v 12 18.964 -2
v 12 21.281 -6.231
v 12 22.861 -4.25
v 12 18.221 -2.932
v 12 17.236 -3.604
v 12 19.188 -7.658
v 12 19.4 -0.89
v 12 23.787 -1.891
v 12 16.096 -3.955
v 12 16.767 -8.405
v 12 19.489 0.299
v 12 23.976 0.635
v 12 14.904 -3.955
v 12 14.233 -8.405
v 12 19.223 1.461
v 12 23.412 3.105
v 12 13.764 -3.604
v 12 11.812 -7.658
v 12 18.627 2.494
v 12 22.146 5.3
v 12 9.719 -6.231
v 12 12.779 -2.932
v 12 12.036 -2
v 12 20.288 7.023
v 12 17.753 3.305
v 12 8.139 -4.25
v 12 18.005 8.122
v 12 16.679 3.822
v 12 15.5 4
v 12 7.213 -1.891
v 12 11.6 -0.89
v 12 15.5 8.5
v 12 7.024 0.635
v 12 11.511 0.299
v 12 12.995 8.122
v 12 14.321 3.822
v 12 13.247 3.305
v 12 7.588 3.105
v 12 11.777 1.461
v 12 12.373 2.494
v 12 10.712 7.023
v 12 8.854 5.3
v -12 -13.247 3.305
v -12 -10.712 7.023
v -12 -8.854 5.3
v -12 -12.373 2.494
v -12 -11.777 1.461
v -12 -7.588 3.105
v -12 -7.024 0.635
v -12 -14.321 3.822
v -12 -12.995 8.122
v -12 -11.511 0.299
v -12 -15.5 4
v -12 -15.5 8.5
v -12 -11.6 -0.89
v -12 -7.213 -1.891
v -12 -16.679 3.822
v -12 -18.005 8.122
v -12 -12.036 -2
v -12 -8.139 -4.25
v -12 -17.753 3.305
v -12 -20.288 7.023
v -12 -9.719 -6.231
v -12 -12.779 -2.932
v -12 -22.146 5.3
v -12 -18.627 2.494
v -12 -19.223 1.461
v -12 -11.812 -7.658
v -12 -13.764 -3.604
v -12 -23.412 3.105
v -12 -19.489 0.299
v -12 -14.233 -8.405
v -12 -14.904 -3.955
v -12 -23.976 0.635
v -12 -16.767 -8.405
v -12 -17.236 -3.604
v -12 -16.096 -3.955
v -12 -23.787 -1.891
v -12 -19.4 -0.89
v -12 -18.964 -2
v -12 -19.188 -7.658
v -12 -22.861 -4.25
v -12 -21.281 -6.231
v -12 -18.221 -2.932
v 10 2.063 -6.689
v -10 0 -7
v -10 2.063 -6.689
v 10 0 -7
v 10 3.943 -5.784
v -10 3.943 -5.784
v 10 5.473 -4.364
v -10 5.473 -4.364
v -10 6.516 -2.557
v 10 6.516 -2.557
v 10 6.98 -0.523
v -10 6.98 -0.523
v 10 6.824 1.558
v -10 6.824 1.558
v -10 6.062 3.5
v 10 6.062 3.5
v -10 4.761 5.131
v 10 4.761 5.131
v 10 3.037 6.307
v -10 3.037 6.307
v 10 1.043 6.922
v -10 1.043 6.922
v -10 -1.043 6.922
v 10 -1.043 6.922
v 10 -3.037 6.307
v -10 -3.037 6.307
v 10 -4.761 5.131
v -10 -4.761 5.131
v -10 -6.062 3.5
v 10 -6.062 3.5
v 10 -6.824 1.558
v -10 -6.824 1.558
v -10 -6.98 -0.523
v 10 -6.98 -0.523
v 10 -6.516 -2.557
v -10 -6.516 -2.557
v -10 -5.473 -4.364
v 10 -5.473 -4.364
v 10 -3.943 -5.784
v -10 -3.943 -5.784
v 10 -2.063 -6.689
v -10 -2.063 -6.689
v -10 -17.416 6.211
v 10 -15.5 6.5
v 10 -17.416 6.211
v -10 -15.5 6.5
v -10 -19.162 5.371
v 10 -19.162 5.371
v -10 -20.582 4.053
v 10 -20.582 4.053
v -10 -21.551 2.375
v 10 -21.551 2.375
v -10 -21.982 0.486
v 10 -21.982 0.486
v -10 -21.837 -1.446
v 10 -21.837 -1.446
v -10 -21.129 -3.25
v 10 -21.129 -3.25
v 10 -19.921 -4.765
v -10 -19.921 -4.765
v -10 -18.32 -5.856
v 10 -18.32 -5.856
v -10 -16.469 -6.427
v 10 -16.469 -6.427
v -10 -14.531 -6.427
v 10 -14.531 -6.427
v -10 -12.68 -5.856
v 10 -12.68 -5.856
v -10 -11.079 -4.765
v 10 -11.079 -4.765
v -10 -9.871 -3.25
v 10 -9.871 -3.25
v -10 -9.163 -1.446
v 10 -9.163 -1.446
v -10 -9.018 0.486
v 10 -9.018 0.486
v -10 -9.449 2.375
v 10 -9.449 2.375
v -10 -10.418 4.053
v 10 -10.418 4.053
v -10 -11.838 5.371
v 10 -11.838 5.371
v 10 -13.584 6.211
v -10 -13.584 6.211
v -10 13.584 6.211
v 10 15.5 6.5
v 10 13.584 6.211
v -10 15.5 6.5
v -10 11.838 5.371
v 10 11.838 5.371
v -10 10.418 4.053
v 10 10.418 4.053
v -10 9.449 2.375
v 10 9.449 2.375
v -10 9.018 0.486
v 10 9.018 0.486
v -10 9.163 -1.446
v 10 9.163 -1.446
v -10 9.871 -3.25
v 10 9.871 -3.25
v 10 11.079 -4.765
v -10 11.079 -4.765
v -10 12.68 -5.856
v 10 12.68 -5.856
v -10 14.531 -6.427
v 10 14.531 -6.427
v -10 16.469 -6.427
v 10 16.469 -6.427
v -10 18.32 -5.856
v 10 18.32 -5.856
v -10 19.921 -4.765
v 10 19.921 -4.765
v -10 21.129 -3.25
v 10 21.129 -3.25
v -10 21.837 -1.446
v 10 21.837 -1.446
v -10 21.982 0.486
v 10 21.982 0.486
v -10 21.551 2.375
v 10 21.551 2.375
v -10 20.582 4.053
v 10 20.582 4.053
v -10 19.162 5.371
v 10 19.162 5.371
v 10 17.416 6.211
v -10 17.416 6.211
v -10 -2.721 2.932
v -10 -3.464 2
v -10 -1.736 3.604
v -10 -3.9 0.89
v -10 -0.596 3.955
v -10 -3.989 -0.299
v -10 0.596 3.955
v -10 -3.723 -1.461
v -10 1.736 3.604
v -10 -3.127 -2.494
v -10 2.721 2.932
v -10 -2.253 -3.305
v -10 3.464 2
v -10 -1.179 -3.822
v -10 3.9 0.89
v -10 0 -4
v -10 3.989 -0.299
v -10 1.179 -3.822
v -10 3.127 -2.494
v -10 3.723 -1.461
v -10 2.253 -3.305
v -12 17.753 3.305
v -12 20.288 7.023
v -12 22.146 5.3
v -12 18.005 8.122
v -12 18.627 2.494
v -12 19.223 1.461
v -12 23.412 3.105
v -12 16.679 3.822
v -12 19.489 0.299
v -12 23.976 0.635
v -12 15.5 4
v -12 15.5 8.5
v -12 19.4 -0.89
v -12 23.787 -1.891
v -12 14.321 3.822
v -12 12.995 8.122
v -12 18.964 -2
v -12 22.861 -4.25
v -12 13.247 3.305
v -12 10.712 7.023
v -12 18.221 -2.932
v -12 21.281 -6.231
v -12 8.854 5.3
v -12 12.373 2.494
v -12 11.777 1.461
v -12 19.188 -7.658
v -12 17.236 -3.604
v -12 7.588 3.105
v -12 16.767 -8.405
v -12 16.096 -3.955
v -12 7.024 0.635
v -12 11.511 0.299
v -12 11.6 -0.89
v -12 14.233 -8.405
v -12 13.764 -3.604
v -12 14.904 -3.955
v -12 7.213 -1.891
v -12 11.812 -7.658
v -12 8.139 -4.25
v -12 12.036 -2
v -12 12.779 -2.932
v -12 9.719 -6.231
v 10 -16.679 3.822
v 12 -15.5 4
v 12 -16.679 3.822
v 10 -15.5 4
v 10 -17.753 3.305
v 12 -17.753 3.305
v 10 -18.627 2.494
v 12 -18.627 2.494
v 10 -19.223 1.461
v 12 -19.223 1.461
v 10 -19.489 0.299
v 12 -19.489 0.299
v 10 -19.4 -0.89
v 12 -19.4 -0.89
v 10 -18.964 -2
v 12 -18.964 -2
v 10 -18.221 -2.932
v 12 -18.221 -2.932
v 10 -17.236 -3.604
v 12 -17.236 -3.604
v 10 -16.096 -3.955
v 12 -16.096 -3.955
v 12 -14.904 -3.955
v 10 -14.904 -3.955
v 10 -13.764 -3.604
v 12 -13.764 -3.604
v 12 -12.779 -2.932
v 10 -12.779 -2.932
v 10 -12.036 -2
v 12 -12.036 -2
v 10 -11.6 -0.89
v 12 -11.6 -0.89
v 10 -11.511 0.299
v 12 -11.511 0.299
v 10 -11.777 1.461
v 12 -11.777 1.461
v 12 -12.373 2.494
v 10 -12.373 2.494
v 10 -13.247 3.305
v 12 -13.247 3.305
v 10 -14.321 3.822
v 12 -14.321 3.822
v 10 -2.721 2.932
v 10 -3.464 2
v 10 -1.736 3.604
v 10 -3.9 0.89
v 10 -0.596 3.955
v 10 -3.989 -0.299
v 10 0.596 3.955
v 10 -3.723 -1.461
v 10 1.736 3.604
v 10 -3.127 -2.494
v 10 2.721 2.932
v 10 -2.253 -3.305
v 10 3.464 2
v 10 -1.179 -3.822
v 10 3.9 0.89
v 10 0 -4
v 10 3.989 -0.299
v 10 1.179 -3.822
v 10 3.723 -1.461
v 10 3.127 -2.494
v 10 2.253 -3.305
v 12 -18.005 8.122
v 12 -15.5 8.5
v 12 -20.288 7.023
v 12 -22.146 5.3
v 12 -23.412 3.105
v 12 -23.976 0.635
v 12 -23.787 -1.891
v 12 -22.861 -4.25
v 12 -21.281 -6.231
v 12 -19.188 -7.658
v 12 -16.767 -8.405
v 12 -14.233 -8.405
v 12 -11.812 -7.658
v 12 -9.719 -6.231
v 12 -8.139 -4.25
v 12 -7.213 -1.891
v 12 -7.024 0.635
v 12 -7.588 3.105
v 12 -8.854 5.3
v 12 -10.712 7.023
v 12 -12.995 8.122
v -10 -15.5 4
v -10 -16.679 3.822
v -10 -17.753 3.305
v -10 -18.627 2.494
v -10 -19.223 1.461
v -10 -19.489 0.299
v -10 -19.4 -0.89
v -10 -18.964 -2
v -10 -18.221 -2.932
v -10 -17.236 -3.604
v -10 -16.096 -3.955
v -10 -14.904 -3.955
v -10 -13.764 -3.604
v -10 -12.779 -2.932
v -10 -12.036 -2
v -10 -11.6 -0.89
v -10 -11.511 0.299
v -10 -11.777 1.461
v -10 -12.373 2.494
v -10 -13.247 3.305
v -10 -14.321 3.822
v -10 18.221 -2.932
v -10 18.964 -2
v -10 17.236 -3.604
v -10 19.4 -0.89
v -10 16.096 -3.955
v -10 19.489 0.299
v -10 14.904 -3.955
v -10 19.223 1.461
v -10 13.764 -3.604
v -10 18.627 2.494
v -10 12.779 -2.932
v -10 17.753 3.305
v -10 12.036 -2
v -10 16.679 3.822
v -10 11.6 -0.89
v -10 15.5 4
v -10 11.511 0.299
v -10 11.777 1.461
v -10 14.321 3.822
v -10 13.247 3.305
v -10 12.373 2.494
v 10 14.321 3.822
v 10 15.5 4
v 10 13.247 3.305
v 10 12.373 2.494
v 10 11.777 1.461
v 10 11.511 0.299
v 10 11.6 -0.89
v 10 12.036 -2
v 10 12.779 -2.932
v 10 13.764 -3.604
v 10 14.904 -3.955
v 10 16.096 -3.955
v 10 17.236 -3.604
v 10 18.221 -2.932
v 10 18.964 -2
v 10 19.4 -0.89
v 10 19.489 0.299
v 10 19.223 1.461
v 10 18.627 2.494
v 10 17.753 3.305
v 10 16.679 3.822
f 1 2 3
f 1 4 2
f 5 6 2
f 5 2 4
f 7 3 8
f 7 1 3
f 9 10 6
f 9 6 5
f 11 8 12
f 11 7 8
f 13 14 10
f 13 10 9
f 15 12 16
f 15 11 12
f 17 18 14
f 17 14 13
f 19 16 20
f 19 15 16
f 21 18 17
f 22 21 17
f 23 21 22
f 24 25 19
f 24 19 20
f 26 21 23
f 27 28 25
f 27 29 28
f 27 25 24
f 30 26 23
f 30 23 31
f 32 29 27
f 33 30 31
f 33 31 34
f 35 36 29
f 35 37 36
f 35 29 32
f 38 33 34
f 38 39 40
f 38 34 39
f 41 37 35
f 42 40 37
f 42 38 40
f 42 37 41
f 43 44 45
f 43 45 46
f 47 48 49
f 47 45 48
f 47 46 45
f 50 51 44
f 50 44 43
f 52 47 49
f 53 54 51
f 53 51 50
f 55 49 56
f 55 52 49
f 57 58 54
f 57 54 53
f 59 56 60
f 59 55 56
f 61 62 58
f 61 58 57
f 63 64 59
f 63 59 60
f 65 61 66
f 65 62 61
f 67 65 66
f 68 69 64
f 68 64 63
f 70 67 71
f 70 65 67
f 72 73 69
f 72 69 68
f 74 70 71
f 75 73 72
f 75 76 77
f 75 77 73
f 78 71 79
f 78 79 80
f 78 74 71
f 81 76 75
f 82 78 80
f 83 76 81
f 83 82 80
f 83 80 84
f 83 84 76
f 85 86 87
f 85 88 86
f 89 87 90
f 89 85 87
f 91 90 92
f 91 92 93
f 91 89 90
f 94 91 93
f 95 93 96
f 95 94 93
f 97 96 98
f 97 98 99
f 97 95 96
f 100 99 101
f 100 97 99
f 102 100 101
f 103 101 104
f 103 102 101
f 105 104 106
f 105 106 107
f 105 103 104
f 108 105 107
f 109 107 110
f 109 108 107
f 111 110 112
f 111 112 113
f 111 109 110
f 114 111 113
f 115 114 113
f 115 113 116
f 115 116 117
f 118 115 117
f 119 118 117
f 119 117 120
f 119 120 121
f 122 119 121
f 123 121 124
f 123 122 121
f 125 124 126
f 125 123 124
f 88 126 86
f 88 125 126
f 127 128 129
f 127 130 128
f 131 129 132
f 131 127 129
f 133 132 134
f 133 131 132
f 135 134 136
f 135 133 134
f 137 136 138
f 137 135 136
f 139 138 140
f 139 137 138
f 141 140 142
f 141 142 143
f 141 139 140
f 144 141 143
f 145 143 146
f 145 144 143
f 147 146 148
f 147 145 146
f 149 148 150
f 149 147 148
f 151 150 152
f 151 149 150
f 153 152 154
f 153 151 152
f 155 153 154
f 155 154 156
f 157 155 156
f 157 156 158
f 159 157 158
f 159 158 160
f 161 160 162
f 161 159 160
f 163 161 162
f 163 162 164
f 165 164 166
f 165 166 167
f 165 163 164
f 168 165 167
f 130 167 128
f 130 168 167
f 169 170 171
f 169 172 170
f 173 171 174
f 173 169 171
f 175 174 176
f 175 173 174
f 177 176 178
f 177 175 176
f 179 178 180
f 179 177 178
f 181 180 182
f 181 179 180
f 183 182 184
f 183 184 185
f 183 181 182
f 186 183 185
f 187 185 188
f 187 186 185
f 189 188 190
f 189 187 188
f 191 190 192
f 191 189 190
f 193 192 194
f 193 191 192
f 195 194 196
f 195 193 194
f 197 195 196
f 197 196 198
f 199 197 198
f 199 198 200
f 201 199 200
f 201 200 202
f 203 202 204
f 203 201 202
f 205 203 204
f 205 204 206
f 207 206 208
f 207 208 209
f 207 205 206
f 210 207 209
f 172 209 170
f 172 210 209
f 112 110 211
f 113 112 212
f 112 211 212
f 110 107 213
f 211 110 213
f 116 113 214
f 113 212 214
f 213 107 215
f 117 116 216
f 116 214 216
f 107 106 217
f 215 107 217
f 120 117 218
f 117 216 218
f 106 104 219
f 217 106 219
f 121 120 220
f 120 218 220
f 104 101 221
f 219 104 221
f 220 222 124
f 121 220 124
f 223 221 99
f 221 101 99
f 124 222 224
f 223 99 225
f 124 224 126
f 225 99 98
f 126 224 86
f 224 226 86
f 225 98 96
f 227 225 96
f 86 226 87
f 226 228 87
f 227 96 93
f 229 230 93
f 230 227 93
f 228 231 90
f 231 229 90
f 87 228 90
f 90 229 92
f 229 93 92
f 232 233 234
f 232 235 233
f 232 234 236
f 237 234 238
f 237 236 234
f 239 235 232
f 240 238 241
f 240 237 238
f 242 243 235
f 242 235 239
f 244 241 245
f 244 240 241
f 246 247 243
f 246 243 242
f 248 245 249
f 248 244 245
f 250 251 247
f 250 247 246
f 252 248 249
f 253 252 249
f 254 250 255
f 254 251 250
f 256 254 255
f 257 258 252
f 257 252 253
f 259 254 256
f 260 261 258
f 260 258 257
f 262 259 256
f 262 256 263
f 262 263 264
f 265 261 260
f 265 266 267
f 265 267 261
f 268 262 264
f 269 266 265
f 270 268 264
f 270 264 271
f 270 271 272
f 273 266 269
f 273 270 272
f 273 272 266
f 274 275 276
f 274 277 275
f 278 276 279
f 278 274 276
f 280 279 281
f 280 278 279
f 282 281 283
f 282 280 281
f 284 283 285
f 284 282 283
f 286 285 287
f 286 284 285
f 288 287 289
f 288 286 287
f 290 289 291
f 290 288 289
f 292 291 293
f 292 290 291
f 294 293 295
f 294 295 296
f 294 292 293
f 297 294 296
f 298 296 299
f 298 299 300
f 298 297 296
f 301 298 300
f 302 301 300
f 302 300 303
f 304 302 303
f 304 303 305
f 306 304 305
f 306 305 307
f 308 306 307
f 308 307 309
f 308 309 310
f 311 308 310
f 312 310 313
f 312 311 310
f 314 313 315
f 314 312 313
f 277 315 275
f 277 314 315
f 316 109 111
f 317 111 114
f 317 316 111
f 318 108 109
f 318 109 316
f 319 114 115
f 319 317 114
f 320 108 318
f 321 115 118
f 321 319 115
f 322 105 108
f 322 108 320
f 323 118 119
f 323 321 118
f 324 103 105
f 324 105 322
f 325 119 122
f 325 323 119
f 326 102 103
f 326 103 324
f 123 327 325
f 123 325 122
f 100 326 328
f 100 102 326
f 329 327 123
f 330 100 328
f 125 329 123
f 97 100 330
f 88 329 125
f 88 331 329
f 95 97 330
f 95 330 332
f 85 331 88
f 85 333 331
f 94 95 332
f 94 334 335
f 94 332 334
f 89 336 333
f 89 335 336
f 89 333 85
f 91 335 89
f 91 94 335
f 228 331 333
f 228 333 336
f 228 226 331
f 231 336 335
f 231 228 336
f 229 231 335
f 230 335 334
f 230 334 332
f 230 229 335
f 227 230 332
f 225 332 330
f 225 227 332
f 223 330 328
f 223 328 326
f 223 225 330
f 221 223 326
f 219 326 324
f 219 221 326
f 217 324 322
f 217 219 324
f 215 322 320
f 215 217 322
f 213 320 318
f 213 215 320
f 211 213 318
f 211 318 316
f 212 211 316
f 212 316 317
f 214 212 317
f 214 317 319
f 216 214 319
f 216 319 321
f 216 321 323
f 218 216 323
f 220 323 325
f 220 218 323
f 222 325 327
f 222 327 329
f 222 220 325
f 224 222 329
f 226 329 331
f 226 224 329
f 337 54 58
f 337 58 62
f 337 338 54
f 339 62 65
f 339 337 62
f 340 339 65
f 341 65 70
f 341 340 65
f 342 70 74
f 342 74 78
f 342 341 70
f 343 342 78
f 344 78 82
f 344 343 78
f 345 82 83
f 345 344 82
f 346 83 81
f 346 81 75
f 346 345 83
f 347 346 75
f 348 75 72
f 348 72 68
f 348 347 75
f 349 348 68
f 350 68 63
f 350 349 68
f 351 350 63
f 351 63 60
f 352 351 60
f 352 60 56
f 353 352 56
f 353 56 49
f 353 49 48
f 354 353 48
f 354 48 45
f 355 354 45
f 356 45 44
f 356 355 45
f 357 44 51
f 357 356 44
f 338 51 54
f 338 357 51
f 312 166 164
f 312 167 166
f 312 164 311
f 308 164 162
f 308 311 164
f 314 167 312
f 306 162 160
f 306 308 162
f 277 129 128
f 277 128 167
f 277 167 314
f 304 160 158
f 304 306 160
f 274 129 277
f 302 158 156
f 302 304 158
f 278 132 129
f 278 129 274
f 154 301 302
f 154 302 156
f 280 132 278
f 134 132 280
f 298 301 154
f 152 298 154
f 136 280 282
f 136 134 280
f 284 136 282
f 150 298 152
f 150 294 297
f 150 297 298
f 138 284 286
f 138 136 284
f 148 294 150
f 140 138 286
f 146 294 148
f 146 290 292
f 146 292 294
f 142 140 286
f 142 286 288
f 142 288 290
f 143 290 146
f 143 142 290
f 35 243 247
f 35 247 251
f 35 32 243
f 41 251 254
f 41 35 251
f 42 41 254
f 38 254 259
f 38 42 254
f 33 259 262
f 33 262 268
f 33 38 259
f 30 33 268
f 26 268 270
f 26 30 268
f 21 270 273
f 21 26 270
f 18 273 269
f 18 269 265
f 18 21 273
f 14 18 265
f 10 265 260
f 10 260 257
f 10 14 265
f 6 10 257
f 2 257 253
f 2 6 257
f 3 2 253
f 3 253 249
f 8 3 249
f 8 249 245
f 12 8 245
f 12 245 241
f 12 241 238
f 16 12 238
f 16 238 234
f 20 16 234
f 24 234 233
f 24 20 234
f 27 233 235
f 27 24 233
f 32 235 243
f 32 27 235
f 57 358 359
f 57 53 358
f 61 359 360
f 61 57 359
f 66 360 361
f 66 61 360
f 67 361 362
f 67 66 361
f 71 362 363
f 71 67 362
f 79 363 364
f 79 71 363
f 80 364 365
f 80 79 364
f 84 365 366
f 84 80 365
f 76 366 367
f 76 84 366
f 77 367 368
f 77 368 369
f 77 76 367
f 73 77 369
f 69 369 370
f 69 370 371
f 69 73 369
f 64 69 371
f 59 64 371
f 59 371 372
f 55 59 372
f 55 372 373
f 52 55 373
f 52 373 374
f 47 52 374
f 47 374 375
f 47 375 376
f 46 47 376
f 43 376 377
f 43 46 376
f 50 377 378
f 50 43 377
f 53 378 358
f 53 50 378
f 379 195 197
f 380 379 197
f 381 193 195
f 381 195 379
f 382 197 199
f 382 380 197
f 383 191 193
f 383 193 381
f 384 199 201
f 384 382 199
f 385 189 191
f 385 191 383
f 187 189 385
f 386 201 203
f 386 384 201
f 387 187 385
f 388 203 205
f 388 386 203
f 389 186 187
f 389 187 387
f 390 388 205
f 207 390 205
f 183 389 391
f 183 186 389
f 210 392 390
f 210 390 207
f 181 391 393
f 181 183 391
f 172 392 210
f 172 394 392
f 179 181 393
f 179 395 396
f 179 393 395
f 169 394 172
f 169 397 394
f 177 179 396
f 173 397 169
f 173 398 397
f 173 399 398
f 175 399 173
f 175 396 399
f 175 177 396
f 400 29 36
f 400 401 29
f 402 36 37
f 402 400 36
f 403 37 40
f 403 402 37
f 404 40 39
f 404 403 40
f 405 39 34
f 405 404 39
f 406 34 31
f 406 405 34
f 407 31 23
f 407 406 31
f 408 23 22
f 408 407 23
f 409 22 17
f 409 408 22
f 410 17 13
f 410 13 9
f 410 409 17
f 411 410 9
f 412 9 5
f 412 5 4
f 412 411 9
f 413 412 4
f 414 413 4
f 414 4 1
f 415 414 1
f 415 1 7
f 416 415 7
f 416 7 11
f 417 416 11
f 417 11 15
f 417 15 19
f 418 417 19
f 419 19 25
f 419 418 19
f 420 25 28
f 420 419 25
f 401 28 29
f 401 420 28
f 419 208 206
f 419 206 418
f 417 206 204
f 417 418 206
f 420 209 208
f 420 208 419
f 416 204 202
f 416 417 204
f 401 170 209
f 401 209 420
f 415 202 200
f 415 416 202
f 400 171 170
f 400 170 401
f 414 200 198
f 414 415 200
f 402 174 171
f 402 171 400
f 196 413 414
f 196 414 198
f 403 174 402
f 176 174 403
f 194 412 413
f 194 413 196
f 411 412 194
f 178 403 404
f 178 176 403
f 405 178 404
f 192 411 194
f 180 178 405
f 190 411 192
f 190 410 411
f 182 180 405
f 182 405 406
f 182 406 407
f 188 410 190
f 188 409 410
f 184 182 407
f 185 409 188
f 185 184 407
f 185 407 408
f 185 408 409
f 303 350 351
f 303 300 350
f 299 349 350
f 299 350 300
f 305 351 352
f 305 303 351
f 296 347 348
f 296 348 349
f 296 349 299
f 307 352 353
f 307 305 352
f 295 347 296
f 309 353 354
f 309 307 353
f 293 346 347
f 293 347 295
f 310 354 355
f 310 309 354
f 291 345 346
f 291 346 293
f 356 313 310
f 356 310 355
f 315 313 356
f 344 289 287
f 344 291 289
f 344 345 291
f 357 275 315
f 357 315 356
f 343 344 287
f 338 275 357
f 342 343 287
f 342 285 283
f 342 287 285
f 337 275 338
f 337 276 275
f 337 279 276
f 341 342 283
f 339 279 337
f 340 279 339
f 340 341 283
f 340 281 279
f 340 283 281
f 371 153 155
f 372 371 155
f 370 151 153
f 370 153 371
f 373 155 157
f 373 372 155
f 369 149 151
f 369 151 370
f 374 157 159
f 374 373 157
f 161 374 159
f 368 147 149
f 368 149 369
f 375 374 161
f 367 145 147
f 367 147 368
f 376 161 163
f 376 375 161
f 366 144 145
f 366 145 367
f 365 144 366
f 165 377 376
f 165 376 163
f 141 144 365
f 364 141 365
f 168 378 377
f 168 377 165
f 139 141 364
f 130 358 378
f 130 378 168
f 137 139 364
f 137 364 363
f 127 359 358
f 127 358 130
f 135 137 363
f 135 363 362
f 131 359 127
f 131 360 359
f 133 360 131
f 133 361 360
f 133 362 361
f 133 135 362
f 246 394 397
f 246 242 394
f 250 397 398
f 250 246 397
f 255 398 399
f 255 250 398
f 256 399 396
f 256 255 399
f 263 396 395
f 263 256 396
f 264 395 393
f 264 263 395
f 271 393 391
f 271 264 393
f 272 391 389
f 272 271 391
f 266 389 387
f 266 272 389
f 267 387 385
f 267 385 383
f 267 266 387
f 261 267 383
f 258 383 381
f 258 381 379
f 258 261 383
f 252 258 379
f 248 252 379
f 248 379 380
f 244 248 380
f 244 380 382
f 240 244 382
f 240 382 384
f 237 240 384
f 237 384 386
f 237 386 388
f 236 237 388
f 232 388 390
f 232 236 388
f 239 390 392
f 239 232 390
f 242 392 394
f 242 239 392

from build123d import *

# Parameters (mm, degrees)
SKETCH1_R           = 7
SKETCH1_R_2         = 4
BOSS_EXTRUDE1_DEPTH = 10


with BuildPart() as part:
    # Sketch1 → Boss-Extrude1 (new, symmetric)
    with BuildSketch(Plane(origin=(0, 0, 0), x_dir=(0, 0, -1), z_dir=(1, 0, 0))):
        Circle(SKETCH1_R)
        Circle(SKETCH1_R_2, mode=Mode.SUBTRACT)
    extrude(amount=BOSS_EXTRUDE1_DEPTH, both=True)


with BuildPart() as body_2:
    # Sketch2 → Revolve1 (revolve)
    with BuildSketch(Plane.XY, mode=Mode.PRIVATE) as revolve1_sk:
        Polygon((-12, 24), (12, 24), (12, 19.5), (10, 19.5), (10, 22), (-10, 22), (-10, 19.5), (-12, 19.5), align=None)
    revolve(revolve1_sk.sketch.rotate(Axis((-16.910318353, 15.5, 0), (1, 0, 0)), 90), axis=Axis((-16.910318353, 15.5, 0), (1, 0, 0)))


with BuildPart() as body_3:
    # Sketch3 → Revolve2 (revolve)
    with BuildSketch(Plane.XY, mode=Mode.PRIVATE) as revolve2_sk:
        Polygon((-12, -24), (12, -24), (12, -19.5), (10, -19.5), (10, -22), (-10, -22), (-10, -19.5), (-12, -19.5), align=None)
    revolve(revolve2_sk.sketch.rotate(Axis((-16.910318353, -15.5, 0), (1, 0, 0)), 270), axis=Axis((-16.910318353, -15.5, 0), (1, 0, 0)))


solid = Compound([part.part, body_2.part, body_3.part])
